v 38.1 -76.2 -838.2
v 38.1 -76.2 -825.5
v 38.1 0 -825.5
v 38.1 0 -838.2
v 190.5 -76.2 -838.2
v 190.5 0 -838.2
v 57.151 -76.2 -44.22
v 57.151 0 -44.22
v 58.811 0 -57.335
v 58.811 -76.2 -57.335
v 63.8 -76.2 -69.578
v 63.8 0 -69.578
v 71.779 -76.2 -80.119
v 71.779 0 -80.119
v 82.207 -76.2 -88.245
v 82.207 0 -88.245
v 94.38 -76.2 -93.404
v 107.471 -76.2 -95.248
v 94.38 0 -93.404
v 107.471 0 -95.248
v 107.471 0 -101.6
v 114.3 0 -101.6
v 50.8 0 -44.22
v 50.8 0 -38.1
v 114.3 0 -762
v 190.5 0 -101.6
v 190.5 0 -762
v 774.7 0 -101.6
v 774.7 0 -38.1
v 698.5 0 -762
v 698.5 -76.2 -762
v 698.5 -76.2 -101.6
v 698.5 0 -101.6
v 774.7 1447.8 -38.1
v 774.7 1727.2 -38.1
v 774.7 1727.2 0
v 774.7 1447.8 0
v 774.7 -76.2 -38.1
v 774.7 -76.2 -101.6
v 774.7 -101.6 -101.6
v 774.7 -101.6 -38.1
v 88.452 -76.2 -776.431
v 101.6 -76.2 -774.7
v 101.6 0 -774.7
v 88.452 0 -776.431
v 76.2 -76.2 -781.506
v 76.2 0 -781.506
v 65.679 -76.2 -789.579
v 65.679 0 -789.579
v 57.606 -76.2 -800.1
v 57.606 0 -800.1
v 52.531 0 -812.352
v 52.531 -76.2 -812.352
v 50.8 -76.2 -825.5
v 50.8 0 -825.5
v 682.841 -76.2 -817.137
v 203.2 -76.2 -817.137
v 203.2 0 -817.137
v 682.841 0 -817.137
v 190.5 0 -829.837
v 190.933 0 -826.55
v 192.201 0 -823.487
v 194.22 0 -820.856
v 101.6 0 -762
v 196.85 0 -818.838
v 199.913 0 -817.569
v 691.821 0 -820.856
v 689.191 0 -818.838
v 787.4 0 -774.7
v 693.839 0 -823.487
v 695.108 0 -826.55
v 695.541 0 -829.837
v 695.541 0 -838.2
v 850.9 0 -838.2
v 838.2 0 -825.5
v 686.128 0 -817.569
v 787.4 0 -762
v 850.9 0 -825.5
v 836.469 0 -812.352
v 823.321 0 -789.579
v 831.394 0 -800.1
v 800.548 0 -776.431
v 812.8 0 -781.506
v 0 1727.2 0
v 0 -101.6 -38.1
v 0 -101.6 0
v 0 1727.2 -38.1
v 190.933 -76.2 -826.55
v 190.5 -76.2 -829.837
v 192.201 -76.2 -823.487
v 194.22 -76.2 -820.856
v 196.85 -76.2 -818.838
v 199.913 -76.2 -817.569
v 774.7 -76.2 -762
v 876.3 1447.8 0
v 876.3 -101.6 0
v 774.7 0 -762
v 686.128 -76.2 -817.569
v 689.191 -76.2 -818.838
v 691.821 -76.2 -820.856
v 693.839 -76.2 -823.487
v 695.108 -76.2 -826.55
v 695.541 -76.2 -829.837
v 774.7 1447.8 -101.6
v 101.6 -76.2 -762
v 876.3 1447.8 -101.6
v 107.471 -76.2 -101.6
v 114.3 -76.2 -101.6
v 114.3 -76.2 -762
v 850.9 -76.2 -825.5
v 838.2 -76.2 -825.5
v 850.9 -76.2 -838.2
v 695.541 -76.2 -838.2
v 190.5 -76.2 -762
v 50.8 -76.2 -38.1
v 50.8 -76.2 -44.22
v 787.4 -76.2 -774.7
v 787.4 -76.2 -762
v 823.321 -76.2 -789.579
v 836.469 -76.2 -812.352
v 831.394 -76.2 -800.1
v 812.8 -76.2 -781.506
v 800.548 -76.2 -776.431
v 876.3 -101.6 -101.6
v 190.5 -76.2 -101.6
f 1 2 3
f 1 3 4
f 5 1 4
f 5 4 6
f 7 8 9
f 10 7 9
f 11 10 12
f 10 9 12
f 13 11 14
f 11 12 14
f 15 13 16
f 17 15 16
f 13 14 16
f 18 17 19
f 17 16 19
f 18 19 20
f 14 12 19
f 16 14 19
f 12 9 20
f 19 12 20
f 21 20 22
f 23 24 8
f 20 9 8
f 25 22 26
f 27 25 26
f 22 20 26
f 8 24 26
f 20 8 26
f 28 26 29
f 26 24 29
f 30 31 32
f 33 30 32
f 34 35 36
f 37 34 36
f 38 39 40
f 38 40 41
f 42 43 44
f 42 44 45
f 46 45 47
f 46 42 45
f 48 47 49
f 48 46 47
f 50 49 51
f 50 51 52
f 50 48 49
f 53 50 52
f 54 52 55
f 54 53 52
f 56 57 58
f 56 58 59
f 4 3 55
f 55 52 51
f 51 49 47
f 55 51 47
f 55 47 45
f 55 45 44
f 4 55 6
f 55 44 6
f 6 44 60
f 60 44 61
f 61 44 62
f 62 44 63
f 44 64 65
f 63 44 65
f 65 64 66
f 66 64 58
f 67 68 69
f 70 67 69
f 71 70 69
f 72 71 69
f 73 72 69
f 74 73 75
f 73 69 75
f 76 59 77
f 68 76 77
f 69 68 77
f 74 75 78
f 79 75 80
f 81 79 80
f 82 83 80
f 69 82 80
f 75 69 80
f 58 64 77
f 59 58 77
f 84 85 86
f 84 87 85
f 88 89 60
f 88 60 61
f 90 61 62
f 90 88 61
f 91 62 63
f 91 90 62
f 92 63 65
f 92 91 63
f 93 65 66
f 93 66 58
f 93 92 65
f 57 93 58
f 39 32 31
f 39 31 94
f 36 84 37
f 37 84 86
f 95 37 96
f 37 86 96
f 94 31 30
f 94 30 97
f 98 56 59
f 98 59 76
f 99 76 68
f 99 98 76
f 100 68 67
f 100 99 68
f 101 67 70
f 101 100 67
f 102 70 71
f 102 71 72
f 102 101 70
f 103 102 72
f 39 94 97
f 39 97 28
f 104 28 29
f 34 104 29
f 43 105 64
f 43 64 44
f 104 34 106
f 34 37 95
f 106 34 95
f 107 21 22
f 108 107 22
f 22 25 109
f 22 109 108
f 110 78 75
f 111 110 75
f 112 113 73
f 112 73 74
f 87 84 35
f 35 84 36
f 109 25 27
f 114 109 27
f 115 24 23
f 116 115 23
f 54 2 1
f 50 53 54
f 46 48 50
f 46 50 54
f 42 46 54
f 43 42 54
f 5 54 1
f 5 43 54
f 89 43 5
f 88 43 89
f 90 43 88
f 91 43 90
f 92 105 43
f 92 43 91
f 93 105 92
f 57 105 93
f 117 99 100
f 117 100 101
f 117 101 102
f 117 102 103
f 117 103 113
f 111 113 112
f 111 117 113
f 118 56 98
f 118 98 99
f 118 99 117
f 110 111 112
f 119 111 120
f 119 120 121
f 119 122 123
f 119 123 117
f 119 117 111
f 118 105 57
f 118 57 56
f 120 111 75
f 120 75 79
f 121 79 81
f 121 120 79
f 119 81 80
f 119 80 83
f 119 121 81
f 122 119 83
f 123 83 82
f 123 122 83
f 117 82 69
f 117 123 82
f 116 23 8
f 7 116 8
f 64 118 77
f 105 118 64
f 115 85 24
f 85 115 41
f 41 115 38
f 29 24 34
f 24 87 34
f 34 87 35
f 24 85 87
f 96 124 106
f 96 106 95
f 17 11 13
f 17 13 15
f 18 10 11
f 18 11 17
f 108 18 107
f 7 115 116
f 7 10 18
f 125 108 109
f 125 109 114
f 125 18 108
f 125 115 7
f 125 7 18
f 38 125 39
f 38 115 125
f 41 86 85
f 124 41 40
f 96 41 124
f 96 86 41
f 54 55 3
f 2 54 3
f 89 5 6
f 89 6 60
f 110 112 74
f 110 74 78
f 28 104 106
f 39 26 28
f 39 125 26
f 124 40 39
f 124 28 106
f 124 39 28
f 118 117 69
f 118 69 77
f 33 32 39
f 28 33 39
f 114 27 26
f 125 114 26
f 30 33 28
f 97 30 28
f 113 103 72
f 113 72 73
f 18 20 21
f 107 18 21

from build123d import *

# Parameters (mm, degrees)
F7_DEPTH      = 76.2
F0_W          = 774.7
F0_H          = 38.1
F8_DEPTH      = 1727.2
F8_DEPTH_BACK = 101.6
F1_W          = 101.6
F1_H          = 101.6
F9_DEPTH      = 101.6
F9_DEPTH_BACK = 1447.8
F10_W         = 76.2
F10_H         = 660.4
F11_DEPTH     = 76.2
F12_W         = 76.2
F12_H         = 660.4
F13_DEPTH     = 76.2
F15_DEPTH     = 76.2


with BuildPart() as f7:
    # F5 (on Front) → F7 (new body)
    with BuildSketch(Plane.XZ):
        with BuildLine():
            Line((50.8, -44.2195832729), (57.1505225604, -44.2195832729))
            ThreePointArc((57.1505225604, -44.2195832729), (71.7788939435, -80.119189599), (107.4706017971, -95.2477379158))
            Line((107.4706017971, -95.2477379158), (107.4706017971, -101.6))
            Line((107.4706017971, -101.6), (774.7, -101.6))
            Line((774.7, -101.6), (774.7, -38.1))
            Line((774.7, -38.1), (50.8, -38.1))
            Line((50.8, -38.1), (50.8, -44.2195832729))
        make_face()
    extrude(amount=F7_DEPTH)

    # F0 (on Front) → F8 (join, two sides)
    with BuildSketch(Plane.XZ) as f8_sk:
        with Locations((387.35, -19.05)):
            Rectangle(F0_W, F0_H)
    extrude(amount=-F8_DEPTH)
    extrude(f8_sk.sketch, amount=F8_DEPTH_BACK)

    # F1 (on Front) → F9 (join, two sides)
    with BuildSketch(Plane.XZ) as f9_sk:
        with Locations((825.5, -50.8)):
            Rectangle(F1_W, F1_H)
    extrude(amount=F9_DEPTH)
    extrude(f9_sk.sketch, amount=-F9_DEPTH_BACK)

    # F10 (on Front) → F11 (join)
    with BuildSketch(Plane.XZ):
        with Locations((152.4, -431.8)):
            Rectangle(F10_W, F10_H)
    extrude(amount=F11_DEPTH)


with BuildPart() as f13:
    # F12 (on face) → F13 (new body)
    with BuildSketch(Plane.XZ.offset(76.2)):
        with Locations((736.6, -431.8)):
            Rectangle(F12_W, F12_H)
    extrude(amount=-F13_DEPTH)


with BuildPart() as f15:
    # F14 (on face) → F15 (new body)
    with BuildSketch(Plane.XZ.offset(76.2)):
        with BuildLine():
            Line((114.3, -762), (101.6, -762))
            Line((101.6, -762), (101.6, -774.7))
            ThreePointArc((101.6, -774.7), (65.6789755157, -789.5789755157), (50.8, -825.5))
            Line((50.8, -825.5), (38.1, -825.5))
            Line((38.1, -825.5), (38.1, -838.2))
            Line((38.1, -838.2), (190.5, -838.2))
            Line((190.5, -838.2), (190.5, -829.8366857529))
            ThreePointArc((190.5, -829.8366857529), (194.2197438789, -820.8564296318), (203.2, -817.1366857529))
            Line((203.2, -817.1366857529), (682.8407261848, -817.1366857529))
            ThreePointArc((682.8407261848, -817.1366857529), (691.8209823059, -820.8564296318), (695.5407261848, -829.8366857529))
            Line((695.5407261848, -829.8366857529), (695.5407261848, -838.2))
            Line((695.5407261848, -838.2), (850.9, -838.2))
            Line((850.9, -838.2), (850.9, -825.5))
            Line((850.9, -825.5), (838.2, -825.5))
            ThreePointArc((838.2, -825.5), (823.3210244843, -789.5789755157), (787.4, -774.7))
            Line((787.4, -774.7), (787.4, -762))
            Line((787.4, -762), (444.5, -762))
            Line((444.5, -762), (190.5, -762))
            Line((190.5, -762), (114.3, -762))
        make_face()
    extrude(amount=-F15_DEPTH)


solid = Compound([f7.part, f13.part, f15.part])
